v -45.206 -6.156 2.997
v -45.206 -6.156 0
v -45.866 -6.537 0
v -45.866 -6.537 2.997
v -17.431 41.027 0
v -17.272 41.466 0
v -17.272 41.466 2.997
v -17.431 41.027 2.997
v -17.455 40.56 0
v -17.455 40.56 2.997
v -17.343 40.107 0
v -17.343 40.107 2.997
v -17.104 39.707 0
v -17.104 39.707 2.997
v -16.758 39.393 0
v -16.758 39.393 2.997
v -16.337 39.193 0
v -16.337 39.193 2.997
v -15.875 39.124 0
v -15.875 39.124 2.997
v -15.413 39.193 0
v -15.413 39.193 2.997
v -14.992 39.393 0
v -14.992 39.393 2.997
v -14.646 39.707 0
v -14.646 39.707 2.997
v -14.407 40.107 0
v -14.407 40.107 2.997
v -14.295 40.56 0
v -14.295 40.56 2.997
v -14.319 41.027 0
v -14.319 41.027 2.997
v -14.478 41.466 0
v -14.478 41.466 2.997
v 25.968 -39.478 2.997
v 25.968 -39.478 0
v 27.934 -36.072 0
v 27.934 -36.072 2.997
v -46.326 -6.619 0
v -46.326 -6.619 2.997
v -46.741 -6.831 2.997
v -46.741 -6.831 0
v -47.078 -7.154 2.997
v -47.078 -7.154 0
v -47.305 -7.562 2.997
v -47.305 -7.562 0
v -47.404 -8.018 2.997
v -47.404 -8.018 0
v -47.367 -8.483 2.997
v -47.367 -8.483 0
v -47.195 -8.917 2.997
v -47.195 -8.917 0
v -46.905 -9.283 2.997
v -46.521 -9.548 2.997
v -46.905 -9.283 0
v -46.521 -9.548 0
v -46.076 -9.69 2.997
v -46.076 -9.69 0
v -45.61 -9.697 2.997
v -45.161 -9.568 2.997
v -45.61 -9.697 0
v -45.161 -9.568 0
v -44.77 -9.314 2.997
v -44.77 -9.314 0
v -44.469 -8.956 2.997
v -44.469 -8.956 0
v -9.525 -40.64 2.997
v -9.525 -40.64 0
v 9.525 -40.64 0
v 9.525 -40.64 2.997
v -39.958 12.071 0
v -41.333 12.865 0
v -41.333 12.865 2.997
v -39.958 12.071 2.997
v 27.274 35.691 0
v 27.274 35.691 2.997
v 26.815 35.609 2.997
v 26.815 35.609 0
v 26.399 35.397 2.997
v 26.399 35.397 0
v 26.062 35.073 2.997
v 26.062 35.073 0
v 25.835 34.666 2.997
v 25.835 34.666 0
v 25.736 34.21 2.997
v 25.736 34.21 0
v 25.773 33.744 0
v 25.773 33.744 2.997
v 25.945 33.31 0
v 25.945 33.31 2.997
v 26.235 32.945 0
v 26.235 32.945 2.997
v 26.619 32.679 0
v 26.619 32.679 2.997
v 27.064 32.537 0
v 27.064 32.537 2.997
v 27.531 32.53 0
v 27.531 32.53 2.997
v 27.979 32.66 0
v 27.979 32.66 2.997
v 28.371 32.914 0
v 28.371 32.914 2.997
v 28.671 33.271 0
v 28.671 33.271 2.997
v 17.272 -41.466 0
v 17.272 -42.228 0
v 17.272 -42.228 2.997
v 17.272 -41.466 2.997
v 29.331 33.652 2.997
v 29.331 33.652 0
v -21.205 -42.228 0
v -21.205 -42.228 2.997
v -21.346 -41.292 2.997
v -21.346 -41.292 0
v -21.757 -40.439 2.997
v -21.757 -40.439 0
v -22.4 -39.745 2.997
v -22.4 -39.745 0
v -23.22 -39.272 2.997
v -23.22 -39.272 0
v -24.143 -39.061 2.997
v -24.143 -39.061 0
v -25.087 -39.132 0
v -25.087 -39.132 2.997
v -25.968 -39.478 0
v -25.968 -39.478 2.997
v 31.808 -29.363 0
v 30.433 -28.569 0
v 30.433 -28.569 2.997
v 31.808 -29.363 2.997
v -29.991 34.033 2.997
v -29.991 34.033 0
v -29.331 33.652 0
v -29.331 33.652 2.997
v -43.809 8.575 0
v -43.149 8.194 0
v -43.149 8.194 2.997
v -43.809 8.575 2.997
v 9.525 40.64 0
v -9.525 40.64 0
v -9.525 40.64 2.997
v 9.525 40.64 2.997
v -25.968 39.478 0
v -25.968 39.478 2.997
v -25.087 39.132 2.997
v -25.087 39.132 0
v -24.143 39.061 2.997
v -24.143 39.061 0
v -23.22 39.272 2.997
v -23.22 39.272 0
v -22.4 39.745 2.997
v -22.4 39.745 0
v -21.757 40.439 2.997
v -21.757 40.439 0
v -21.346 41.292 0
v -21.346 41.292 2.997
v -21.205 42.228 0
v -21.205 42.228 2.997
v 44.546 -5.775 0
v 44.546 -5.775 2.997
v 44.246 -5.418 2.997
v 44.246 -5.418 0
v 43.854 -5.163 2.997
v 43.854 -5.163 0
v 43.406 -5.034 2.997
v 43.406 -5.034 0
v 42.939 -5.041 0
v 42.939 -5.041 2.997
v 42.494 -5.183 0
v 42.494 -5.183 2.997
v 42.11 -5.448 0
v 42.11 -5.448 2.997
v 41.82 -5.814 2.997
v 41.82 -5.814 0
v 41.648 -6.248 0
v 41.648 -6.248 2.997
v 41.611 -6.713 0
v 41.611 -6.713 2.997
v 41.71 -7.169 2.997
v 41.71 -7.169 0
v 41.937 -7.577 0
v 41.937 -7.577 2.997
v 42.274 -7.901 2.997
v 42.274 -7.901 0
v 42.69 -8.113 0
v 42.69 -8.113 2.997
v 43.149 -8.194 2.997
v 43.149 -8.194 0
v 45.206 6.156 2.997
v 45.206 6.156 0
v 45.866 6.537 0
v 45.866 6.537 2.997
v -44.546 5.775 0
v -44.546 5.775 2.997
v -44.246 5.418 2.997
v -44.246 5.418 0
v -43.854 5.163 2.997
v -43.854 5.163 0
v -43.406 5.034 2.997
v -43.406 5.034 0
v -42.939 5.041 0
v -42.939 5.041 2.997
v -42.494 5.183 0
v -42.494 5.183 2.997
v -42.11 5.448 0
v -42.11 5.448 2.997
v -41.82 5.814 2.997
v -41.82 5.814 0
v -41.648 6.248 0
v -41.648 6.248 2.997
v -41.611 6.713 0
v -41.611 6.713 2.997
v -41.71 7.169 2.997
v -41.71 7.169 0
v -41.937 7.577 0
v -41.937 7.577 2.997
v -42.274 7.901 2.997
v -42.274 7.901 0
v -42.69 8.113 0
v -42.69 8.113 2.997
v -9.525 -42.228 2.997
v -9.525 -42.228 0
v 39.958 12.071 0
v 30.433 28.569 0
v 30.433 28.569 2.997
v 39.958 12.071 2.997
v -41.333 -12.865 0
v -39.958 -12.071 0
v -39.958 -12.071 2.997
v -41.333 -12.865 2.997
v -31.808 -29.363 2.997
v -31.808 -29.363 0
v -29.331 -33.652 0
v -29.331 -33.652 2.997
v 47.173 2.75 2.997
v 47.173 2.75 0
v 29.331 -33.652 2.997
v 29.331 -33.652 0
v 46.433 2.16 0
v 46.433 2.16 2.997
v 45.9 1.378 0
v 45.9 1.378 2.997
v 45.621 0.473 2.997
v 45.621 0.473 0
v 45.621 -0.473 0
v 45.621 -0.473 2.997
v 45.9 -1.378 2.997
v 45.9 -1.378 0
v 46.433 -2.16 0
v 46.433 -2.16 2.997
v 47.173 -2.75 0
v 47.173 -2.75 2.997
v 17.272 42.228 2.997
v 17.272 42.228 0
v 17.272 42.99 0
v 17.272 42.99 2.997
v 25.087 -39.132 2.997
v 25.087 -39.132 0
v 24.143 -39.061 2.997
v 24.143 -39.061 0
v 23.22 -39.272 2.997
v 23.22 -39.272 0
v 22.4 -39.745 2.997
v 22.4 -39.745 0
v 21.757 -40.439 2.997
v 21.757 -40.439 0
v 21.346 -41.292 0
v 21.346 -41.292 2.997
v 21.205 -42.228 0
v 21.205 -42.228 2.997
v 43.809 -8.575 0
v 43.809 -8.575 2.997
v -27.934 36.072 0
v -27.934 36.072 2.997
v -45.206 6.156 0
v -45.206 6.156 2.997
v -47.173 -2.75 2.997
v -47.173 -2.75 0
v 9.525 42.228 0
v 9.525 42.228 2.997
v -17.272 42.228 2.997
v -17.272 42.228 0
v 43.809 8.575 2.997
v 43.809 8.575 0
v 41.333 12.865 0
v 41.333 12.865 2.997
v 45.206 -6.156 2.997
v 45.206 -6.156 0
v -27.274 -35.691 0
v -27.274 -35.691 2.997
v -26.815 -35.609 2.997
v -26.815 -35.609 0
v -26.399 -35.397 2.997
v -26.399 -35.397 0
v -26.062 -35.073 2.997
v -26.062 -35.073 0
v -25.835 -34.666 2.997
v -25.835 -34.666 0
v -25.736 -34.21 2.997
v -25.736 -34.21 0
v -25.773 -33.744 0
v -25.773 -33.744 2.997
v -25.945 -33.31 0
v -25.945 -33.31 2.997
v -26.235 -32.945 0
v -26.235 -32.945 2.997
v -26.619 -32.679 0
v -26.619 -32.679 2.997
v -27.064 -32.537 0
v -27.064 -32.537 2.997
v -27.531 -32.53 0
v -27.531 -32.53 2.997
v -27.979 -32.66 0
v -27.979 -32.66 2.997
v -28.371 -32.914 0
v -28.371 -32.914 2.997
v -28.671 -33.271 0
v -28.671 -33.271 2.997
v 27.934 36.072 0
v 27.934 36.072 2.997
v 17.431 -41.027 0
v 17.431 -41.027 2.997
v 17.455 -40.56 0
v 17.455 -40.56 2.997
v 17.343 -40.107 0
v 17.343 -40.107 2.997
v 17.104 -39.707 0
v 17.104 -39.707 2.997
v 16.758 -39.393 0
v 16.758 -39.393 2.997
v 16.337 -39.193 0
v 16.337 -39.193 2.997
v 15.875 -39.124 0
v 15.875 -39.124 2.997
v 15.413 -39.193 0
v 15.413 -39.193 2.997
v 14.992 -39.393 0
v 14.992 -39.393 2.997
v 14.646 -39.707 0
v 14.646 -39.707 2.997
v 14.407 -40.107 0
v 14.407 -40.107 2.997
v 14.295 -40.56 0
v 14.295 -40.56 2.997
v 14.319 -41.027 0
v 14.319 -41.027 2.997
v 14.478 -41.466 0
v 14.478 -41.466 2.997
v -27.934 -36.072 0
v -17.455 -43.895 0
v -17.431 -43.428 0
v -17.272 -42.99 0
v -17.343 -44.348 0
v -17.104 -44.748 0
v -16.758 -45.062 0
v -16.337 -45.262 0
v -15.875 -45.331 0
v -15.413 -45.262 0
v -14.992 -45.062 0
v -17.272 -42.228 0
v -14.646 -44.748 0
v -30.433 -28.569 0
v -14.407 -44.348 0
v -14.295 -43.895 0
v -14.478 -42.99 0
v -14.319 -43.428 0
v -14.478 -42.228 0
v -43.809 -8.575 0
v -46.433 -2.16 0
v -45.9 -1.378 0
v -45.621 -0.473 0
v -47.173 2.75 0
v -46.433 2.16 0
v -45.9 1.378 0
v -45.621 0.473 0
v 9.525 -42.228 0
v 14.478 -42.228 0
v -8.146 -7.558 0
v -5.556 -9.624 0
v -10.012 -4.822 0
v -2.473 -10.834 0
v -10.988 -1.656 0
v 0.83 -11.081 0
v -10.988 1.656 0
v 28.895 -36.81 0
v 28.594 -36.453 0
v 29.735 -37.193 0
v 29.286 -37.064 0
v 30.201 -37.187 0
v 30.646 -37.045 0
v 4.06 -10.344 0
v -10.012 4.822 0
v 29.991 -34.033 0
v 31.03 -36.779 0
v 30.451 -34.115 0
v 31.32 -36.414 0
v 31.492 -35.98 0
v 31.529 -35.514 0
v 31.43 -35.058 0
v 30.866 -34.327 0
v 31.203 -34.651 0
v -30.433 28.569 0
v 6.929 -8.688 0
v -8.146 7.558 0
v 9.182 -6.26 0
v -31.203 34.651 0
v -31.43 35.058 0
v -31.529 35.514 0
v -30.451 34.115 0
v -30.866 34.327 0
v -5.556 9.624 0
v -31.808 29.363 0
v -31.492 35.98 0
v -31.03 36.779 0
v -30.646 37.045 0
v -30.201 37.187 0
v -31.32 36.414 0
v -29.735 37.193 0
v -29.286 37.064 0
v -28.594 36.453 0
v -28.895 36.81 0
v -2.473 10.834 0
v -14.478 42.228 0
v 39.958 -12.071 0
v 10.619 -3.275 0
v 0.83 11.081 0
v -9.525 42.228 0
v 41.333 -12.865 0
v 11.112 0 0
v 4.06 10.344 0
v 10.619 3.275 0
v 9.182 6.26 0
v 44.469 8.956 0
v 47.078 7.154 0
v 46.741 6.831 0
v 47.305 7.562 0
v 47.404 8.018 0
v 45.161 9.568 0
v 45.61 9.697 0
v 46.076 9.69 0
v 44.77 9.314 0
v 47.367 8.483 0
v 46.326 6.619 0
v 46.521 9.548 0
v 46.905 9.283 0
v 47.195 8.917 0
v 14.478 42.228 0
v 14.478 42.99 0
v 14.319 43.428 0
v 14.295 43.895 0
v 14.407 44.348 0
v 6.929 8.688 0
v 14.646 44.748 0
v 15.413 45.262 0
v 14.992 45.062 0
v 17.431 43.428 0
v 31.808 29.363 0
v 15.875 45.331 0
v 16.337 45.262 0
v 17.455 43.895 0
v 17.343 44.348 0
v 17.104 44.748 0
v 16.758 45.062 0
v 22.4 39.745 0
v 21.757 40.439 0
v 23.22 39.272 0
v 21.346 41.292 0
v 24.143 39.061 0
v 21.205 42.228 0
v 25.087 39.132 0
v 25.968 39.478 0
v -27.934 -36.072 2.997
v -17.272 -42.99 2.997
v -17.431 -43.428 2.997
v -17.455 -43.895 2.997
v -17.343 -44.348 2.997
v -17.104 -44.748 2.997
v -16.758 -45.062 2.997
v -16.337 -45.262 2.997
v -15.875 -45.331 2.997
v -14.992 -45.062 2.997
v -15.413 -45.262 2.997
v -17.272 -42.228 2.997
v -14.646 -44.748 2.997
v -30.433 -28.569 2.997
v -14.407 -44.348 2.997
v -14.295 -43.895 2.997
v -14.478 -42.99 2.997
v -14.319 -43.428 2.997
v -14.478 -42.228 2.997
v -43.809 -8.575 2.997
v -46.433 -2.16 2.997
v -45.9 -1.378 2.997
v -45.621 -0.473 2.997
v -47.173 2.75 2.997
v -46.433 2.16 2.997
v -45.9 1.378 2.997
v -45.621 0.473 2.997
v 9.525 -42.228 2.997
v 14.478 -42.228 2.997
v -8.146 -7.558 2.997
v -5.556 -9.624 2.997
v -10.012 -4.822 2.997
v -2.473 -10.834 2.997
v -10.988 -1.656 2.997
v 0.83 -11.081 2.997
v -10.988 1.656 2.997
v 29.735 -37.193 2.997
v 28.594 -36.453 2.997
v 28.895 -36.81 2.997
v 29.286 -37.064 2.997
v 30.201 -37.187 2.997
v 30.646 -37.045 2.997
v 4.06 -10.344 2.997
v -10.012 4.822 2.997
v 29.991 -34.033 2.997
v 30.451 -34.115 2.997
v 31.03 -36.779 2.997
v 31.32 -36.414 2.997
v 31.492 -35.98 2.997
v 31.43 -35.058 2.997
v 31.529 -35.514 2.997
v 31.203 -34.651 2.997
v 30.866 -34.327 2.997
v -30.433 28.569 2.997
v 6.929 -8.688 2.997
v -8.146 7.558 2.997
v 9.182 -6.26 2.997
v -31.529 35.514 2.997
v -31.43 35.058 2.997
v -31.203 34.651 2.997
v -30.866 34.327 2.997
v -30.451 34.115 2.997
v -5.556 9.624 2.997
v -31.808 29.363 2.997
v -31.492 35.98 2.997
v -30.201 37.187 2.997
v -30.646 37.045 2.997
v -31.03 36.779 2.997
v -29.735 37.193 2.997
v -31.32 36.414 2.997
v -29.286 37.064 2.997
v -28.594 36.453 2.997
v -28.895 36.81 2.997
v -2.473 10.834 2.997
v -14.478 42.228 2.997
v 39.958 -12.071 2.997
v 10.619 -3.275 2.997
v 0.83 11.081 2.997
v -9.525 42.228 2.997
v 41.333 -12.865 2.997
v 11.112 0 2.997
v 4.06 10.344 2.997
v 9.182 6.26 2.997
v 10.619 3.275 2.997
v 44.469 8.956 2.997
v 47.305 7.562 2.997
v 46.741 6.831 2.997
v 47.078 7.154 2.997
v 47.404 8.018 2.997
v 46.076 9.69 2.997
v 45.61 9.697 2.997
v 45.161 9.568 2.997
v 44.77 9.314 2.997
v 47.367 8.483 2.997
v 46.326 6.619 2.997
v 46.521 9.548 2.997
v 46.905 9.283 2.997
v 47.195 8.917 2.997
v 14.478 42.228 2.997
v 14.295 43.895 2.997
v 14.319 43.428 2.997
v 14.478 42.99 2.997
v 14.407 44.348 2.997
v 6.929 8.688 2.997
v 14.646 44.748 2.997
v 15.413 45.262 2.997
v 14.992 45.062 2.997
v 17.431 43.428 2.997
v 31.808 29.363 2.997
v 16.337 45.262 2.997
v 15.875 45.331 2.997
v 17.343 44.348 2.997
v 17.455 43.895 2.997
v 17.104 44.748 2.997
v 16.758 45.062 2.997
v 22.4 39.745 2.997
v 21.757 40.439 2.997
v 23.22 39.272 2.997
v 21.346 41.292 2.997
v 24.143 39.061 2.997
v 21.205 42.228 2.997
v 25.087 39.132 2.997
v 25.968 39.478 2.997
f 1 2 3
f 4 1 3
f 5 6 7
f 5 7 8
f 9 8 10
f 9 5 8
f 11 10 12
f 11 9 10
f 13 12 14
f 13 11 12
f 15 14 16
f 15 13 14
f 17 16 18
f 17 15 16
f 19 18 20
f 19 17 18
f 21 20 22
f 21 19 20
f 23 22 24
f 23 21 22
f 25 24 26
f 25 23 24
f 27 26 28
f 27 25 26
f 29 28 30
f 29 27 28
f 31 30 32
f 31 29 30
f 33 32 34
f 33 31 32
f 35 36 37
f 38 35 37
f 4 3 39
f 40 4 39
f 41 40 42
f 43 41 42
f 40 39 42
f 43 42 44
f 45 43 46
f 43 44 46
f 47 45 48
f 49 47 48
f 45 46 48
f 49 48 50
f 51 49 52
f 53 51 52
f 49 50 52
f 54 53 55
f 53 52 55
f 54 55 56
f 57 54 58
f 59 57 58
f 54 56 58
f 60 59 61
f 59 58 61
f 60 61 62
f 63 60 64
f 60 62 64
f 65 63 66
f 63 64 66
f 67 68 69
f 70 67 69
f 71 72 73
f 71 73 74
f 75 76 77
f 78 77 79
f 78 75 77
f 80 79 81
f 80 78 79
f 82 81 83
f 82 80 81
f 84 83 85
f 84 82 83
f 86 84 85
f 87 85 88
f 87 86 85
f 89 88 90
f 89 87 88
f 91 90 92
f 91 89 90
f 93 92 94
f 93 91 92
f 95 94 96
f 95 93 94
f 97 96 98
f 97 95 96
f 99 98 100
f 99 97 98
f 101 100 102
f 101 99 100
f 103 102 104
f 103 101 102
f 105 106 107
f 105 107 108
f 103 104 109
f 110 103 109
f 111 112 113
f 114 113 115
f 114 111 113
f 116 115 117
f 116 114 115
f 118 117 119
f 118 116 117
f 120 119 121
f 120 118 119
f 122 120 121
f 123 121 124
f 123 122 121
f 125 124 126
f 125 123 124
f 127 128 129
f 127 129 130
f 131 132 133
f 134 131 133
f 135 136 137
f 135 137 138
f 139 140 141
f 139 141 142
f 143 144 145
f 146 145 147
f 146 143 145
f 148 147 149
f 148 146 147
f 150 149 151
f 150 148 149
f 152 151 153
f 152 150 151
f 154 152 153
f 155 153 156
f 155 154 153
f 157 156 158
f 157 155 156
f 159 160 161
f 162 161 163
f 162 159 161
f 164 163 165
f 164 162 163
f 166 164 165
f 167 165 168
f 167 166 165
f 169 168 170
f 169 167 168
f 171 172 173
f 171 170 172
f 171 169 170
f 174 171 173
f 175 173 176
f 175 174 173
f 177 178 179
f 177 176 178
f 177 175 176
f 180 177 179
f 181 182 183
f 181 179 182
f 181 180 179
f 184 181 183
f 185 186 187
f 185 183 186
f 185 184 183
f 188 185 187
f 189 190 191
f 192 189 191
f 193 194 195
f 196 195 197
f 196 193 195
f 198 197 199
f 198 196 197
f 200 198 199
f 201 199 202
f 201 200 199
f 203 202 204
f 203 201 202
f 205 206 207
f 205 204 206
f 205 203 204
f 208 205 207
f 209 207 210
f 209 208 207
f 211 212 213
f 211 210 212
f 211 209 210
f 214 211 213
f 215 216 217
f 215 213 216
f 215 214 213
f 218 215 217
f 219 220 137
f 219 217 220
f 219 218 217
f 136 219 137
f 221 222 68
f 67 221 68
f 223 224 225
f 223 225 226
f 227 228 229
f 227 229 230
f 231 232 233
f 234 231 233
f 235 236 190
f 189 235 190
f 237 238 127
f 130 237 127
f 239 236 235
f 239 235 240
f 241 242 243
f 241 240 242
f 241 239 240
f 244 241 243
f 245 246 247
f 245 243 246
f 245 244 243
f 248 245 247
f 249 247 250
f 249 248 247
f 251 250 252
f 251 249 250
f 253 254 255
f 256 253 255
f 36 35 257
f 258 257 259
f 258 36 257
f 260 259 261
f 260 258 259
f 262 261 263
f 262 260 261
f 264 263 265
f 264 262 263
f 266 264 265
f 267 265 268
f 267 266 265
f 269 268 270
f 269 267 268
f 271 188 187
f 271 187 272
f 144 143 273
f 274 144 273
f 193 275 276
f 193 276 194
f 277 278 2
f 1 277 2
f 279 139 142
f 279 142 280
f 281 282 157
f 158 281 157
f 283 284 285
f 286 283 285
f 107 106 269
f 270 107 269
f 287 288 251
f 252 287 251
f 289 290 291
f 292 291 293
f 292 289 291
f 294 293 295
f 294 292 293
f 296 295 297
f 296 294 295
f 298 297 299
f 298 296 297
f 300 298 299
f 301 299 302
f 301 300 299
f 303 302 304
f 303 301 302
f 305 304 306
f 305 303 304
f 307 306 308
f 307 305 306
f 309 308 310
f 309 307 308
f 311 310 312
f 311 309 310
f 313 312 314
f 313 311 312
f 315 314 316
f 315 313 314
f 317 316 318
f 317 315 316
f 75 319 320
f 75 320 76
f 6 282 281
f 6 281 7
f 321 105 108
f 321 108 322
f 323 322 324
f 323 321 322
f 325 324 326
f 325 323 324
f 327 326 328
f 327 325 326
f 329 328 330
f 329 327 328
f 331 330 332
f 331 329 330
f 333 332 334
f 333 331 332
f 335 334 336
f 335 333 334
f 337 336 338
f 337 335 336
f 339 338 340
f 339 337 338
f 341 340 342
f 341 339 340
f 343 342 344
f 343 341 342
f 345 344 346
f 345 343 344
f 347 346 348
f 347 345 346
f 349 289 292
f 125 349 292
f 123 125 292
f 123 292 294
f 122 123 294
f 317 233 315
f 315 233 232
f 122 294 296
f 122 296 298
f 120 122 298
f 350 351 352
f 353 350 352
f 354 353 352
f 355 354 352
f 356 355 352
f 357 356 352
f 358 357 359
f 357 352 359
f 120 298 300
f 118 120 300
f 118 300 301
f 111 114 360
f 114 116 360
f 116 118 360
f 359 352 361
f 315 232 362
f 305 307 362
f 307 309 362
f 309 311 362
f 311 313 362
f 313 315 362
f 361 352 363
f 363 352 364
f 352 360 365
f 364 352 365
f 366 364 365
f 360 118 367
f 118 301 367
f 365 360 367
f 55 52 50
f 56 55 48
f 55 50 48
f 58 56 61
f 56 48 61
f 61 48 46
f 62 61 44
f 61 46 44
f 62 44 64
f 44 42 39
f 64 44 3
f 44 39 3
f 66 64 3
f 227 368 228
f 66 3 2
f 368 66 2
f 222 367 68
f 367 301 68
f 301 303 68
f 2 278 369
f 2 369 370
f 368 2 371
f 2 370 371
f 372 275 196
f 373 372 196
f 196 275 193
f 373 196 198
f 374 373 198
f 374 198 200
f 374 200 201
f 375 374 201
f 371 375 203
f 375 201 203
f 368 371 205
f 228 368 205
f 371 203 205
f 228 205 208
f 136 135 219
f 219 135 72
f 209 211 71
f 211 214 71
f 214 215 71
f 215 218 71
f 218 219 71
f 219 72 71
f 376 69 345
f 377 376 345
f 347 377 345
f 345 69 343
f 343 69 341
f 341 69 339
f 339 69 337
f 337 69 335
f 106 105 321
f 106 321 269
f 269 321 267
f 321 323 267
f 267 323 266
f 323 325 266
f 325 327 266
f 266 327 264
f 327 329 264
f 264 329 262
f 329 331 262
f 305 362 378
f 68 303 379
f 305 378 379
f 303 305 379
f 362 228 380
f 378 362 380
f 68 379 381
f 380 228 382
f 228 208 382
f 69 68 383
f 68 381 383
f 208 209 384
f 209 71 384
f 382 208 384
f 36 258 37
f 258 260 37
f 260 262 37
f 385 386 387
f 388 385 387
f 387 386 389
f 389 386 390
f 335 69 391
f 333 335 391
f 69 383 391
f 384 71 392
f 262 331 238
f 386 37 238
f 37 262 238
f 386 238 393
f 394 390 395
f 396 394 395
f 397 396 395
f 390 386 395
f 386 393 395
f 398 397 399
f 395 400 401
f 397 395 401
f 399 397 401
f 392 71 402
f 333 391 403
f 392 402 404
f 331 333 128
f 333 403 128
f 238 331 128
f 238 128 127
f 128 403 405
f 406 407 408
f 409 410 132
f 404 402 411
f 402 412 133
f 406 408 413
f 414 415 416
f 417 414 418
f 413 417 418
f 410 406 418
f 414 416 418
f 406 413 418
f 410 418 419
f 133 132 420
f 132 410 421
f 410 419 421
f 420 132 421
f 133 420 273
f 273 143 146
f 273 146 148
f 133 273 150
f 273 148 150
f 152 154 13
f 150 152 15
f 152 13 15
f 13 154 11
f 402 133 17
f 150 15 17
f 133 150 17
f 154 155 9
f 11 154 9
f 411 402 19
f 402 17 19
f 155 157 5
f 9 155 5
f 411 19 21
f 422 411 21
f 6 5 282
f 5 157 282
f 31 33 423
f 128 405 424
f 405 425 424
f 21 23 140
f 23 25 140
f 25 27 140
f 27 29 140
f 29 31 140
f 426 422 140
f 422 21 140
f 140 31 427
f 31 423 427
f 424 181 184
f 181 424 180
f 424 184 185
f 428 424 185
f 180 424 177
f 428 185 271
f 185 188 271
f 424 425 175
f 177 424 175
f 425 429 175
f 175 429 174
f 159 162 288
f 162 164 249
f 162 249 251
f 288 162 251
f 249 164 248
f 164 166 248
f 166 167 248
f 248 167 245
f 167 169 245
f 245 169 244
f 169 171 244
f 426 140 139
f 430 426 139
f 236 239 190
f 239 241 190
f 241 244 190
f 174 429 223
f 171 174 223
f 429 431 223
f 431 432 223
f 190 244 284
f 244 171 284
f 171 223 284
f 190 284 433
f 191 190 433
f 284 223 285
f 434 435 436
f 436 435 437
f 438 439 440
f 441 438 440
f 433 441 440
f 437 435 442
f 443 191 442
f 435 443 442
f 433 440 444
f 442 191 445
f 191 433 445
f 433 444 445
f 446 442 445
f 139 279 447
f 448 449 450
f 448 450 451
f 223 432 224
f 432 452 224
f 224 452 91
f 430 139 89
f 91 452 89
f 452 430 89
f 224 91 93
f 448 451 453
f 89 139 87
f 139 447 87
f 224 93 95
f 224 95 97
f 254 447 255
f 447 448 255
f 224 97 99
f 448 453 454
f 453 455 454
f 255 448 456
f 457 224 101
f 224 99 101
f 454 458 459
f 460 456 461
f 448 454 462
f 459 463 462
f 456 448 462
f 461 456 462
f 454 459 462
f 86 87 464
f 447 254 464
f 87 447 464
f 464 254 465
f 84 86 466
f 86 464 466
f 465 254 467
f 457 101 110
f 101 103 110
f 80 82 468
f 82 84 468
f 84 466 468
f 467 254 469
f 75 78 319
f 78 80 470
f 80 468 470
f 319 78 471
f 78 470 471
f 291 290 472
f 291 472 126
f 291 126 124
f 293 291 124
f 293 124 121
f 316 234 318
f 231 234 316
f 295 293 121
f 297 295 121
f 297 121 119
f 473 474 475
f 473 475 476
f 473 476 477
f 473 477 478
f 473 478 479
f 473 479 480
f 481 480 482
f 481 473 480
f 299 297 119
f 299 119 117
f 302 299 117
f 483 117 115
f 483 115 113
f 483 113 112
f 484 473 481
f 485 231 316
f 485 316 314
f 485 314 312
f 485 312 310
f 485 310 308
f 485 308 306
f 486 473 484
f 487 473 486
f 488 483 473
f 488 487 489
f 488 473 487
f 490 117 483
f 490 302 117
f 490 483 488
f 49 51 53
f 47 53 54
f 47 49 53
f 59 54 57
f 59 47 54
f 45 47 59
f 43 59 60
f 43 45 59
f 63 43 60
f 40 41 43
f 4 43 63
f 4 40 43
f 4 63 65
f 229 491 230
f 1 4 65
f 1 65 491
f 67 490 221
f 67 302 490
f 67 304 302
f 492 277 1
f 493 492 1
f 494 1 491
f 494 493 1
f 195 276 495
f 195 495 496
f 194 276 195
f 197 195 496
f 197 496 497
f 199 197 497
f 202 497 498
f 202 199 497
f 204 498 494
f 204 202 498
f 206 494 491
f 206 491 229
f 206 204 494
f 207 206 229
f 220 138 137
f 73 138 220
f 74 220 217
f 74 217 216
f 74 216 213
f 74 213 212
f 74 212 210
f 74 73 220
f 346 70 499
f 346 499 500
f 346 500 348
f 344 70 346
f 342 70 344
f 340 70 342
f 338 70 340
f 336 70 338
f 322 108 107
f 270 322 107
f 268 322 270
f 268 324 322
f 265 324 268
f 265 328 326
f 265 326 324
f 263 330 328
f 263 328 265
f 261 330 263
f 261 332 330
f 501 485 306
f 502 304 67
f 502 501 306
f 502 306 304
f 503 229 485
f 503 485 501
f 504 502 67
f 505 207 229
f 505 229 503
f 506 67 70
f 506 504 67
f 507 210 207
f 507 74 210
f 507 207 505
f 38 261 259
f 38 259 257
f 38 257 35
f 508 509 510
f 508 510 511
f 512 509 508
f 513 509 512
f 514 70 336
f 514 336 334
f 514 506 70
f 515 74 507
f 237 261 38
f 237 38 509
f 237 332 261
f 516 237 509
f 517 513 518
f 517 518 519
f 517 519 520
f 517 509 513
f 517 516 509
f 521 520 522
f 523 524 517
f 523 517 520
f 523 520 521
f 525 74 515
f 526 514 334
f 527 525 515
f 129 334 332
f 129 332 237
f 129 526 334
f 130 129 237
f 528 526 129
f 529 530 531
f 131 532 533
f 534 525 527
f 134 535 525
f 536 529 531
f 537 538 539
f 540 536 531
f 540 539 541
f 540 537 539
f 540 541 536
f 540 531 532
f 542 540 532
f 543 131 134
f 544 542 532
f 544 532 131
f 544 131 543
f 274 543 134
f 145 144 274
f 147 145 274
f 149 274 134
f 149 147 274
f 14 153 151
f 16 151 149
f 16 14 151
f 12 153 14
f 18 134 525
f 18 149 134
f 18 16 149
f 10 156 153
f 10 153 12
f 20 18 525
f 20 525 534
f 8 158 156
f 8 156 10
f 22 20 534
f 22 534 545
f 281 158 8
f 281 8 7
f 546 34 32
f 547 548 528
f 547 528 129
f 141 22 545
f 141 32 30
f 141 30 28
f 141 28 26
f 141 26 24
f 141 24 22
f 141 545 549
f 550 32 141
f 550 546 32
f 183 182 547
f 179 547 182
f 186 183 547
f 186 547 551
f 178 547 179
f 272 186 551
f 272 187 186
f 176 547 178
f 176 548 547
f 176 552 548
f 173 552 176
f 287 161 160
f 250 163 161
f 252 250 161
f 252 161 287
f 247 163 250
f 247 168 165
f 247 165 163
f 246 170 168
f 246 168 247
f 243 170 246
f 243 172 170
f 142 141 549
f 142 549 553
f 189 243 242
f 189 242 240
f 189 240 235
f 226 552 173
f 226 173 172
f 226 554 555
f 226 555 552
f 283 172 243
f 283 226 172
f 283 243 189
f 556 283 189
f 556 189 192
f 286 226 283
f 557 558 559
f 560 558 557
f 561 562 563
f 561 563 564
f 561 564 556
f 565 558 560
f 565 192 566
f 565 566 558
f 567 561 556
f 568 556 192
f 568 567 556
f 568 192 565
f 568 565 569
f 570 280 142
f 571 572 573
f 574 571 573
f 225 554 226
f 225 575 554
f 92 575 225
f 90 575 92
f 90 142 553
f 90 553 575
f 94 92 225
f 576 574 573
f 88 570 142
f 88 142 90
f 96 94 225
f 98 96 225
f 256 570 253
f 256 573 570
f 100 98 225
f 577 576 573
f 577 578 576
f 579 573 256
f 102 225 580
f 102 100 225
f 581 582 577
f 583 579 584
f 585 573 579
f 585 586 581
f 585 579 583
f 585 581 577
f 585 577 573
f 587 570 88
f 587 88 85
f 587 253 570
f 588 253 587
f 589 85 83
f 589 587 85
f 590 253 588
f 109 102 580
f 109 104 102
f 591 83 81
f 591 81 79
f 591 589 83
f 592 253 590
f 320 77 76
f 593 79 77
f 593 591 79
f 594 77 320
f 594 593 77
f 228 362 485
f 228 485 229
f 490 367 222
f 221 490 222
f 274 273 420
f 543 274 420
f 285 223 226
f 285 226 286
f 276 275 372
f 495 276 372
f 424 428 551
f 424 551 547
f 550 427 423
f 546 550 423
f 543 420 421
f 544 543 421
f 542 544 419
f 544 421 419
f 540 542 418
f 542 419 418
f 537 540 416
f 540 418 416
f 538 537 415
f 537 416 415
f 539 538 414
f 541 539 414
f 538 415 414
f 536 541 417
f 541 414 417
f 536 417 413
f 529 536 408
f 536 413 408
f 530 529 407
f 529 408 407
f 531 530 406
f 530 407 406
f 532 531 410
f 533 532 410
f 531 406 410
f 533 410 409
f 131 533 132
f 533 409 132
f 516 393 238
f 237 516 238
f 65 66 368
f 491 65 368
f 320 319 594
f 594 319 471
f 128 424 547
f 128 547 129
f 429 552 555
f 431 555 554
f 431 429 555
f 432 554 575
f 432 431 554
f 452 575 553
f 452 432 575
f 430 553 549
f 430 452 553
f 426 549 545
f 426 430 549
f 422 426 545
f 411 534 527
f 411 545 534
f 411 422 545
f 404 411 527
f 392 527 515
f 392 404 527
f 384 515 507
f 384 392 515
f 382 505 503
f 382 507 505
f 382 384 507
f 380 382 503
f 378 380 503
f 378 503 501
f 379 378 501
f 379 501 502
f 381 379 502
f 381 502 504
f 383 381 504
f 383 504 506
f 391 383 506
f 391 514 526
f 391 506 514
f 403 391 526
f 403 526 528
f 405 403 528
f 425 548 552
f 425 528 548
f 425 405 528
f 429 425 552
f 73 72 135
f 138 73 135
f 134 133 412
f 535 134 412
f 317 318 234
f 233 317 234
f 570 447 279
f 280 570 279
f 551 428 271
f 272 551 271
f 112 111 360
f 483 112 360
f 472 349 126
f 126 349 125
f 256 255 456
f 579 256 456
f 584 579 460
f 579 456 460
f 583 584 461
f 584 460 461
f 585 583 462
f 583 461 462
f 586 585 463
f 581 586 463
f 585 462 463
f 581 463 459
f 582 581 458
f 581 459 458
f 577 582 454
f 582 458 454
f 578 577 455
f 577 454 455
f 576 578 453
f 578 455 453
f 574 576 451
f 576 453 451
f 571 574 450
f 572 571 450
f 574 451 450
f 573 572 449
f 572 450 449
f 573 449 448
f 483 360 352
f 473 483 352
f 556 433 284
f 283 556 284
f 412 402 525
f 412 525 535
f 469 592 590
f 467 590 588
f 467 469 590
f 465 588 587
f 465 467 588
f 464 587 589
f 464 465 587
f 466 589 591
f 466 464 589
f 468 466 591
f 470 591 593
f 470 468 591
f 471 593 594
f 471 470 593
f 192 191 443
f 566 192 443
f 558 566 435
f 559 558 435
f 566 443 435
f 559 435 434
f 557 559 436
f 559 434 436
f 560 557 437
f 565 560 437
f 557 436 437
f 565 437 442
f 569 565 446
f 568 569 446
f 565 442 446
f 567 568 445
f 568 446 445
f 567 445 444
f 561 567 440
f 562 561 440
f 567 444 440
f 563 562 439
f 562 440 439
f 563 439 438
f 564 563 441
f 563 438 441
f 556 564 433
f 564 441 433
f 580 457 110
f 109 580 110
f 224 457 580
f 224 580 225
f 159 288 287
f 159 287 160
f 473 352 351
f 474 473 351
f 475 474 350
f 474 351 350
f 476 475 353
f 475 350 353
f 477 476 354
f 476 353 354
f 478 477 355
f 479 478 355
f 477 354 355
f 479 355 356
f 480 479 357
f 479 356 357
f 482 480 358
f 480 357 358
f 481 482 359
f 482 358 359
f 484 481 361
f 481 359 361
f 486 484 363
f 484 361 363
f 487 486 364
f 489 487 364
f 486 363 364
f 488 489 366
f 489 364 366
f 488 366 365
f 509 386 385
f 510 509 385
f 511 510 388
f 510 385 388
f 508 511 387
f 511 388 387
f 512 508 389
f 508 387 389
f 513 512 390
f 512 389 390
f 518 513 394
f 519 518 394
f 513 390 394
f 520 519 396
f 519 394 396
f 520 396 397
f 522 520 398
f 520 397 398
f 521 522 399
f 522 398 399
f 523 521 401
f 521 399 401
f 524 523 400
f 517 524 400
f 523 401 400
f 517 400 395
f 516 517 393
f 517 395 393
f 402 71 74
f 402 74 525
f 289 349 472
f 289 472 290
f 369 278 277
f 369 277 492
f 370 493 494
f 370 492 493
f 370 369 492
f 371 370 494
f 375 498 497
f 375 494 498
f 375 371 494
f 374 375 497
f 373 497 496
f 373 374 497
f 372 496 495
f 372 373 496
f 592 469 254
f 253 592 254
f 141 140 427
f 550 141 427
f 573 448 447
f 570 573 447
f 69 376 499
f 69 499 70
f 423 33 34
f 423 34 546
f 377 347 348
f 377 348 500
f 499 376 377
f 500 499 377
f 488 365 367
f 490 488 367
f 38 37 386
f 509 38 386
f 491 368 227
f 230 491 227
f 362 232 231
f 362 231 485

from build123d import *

# Parameters (mm, degrees)
F1_DEPTH = 2.9972
F2_W     = 19.05
F2_H     = 1.5875
F2_R     = 11.1125
F3_DEPTH = 2.9982
F5_DEPTH = 2.9972


with BuildPart() as f1:
    # F0 (on Top) → F1 (new body)
    with BuildSketch(Plane.XY):
        Polygon((-24.3800584922, 42.2275), (-48.7601169844, 0), (-24.3800584922, -42.2275), (24.3800584922, -42.2275), (48.7601169844, 0), (24.3800584922, 42.2275), align=None)
    extrude(amount=F1_DEPTH)

    # F2 (on Top) → F3 (cut, through all)
    with BuildSketch(Plane.XY):
        with Locations((0, 41.43375)):
            Rectangle(F2_W, F2_H)
        with BuildLine():
            Line((-17.272, 42.2275), (-17.272, 41.4655))
            ThreePointArc((-17.272, 41.4655), (-15.875, 39.1239792775), (-14.478, 41.4655))
            Line((-14.478, 41.4655), (-14.478, 42.2275))
            Line((-14.478, 42.2275), (-17.272, 42.2275))
        make_face()
        with BuildLine():
            Line((-24.3800584922, 42.2275), (-25.9675584922, 39.477869343))
            ThreePointArc((-25.9675584922, 39.477869343), (-22.7925584922, 39.477869343), (-21.2050584922, 42.2275))
            Line((-21.2050584922, 42.2275), (-24.3800584922, 42.2275))
        make_face()
        Polygon((-31.8075877383, 29.362641971), (-41.3325877383, 12.864858029), (-39.9577724098, 12.071108029), (-30.4327724098, 28.568891971), align=None)
        with BuildLine():
            Line((-48.7601169844, 0), (-47.1726169844, -2.749630657))
            ThreePointArc((-47.1726169844, -2.749630657), (-45.5851169844, 0), (-47.1726169844, 2.749630657))
            Line((-47.1726169844, 2.749630657), (-48.7601169844, 0))
        make_face()
        with BuildLine():
            Line((-45.2060877383, 6.1557592258), (-44.5461763806, 5.7747592258))
            ThreePointArc((-44.5461763806, 5.7747592258), (-41.8198599514, 5.8138363537), (-43.1491763806, 8.194434204))
            Line((-43.1491763806, 8.194434204), (-43.8090877383, 8.575434204))
            Line((-43.8090877383, 8.575434204), (-45.2060877383, 6.1557592258))
        make_face()
        Polygon((-41.3325877383, -12.864858029), (-31.8075877383, -29.362641971), (-30.4327724098, -28.568891971), (-39.9577724098, -12.071108029), align=None)
        with BuildLine():
            Line((-24.3800584922, -42.2275), (-21.2050584922, -42.2275))
            ThreePointArc((-21.2050584922, -42.2275), (-22.7925584922, -39.477869343), (-25.9675584922, -39.477869343))
            Line((-25.9675584922, -39.477869343), (-24.3800584922, -42.2275))
        make_face()
        with BuildLine():
            Line((-27.9340877383, -36.0717407742), (-27.2741763806, -35.6907407742))
            ThreePointArc((-27.2741763806, -35.6907407742), (-25.9448599514, -33.3101429238), (-28.6711763806, -33.271065796))
            Line((-28.6711763806, -33.271065796), (-29.3310877383, -33.652065796))
            Line((-29.3310877383, -33.652065796), (-27.9340877383, -36.0717407742))
        make_face()
        with Locations((0, -41.43375)):
            Rectangle(F2_W, F2_H)
        with BuildLine():
            Line((24.3800584922, -42.2275), (25.9675584922, -39.477869343))
            ThreePointArc((25.9675584922, -39.477869343), (22.7925584922, -39.477869343), (21.2050584922, -42.2275))
            Line((21.2050584922, -42.2275), (24.3800584922, -42.2275))
        make_face()
        with BuildLine():
            Line((17.272, -42.2275), (17.272, -41.4655))
            ThreePointArc((17.272, -41.4655), (15.875, -39.1239792775), (14.478, -41.4655))
            Line((14.478, -41.4655), (14.478, -42.2275))
            Line((14.478, -42.2275), (17.272, -42.2275))
        make_face()
        Polygon((31.8075877383, -29.362641971), (41.3325877383, -12.864858029), (39.9577724098, -12.071108029), (30.4327724098, -28.568891971), align=None)
        with BuildLine():
            Line((48.7601169844, 0), (47.1726169844, 2.749630657))
            ThreePointArc((47.1726169844, 2.749630657), (45.5851169844, 0), (47.1726169844, -2.749630657))
            Line((47.1726169844, -2.749630657), (48.7601169844, 0))
        make_face()
        with BuildLine():
            Line((45.2060877383, -6.1557592258), (44.5461763806, -5.7747592258))
            ThreePointArc((44.5461763806, -5.7747592258), (41.8198599514, -5.8138363537), (43.1491763806, -8.194434204))
            Line((43.1491763806, -8.194434204), (43.8090877383, -8.575434204))
            Line((43.8090877383, -8.575434204), (45.2060877383, -6.1557592258))
        make_face()
        Polygon((41.3325877383, 12.864858029), (31.8075877383, 29.362641971), (30.4327724098, 28.568891971), (39.9577724098, 12.071108029), align=None)
        with BuildLine():
            Line((24.3800584922, 42.2275), (21.2050584922, 42.2275))
            ThreePointArc((21.2050584922, 42.2275), (22.7925584922, 39.477869343), (25.9675584922, 39.477869343))
            Line((25.9675584922, 39.477869343), (24.3800584922, 42.2275))
        make_face()
        with BuildLine():
            Line((27.9340877383, 36.0717407742), (27.2741763806, 35.6907407742))
            ThreePointArc((27.2741763806, 35.6907407742), (25.9448599514, 33.3101429238), (28.6711763806, 33.271065796))
            Line((28.6711763806, 33.271065796), (29.3310877383, 33.652065796))
            Line((29.3310877383, 33.652065796), (27.9340877383, 36.0717407742))
        make_face()
        Circle(F2_R)
    extrude(amount=F3_DEPTH, mode=Mode.SUBTRACT)

    # F4 (on Top) → F5 (join, through all)
    with BuildSketch(Plane.XY):
        with BuildLine():
            Line((17.272, 42.2275), (17.272, 42.9895))
            ThreePointArc((17.272, 42.9895), (15.875, 45.3310207225), (14.478, 42.9895))
            Line((14.478, 42.9895), (14.478, 42.2275))
            Line((14.478, 42.2275), (17.272, 42.2275))
        make_face()
        with BuildLine():
            Line((-29.990999096, 34.033065796), (-29.3310877383, 33.652065796))
            Line((-29.3310877383, 33.652065796), (-27.9340877383, 36.0717407742))
            Line((-27.9340877383, 36.0717407742), (-28.593999096, 36.4527407742))
            ThreePointArc((-28.593999096, 36.4527407742), (-31.3203155252, 36.4136636463), (-29.990999096, 34.033065796))
        make_face()
        with BuildLine():
            Line((-44.468999096, -8.956434204), (-43.8090877383, -8.575434204))
            Line((-43.8090877383, -8.575434204), (-45.2060877383, -6.1557592258))
            Line((-45.2060877383, -6.1557592258), (-45.865999096, -6.5367592258))
            ThreePointArc((-45.865999096, -6.5367592258), (-47.1953155252, -8.9173570762), (-44.468999096, -8.956434204))
        make_face()
        with BuildLine():
            Line((-14.478, -42.9895), (-14.478, -42.2275))
            Line((-14.478, -42.2275), (-17.272, -42.2275))
            Line((-17.272, -42.2275), (-17.272, -42.9895))
            ThreePointArc((-17.272, -42.9895), (-15.875, -45.3310207225), (-14.478, -42.9895))
        make_face()
        with BuildLine():
            Line((29.990999096, -34.033065796), (29.3310877383, -33.652065796))
            Line((29.3310877383, -33.652065796), (27.9340877383, -36.0717407742))
            Line((27.9340877383, -36.0717407742), (28.593999096, -36.4527407742))
            ThreePointArc((28.593999096, -36.4527407742), (31.3203155252, -36.4136636463), (29.990999096, -34.033065796))
        make_face()
        with BuildLine():
            Line((44.468999096, 8.956434204), (43.8090877383, 8.575434204))
            Line((43.8090877383, 8.575434204), (45.2060877383, 6.1557592258))
            Line((45.2060877383, 6.1557592258), (45.865999096, 6.5367592258))
            ThreePointArc((45.865999096, 6.5367592258), (47.1953155252, 8.9173570762), (44.468999096, 8.956434204))
        make_face()
    extrude(amount=F5_DEPTH)


solid = f1.part
